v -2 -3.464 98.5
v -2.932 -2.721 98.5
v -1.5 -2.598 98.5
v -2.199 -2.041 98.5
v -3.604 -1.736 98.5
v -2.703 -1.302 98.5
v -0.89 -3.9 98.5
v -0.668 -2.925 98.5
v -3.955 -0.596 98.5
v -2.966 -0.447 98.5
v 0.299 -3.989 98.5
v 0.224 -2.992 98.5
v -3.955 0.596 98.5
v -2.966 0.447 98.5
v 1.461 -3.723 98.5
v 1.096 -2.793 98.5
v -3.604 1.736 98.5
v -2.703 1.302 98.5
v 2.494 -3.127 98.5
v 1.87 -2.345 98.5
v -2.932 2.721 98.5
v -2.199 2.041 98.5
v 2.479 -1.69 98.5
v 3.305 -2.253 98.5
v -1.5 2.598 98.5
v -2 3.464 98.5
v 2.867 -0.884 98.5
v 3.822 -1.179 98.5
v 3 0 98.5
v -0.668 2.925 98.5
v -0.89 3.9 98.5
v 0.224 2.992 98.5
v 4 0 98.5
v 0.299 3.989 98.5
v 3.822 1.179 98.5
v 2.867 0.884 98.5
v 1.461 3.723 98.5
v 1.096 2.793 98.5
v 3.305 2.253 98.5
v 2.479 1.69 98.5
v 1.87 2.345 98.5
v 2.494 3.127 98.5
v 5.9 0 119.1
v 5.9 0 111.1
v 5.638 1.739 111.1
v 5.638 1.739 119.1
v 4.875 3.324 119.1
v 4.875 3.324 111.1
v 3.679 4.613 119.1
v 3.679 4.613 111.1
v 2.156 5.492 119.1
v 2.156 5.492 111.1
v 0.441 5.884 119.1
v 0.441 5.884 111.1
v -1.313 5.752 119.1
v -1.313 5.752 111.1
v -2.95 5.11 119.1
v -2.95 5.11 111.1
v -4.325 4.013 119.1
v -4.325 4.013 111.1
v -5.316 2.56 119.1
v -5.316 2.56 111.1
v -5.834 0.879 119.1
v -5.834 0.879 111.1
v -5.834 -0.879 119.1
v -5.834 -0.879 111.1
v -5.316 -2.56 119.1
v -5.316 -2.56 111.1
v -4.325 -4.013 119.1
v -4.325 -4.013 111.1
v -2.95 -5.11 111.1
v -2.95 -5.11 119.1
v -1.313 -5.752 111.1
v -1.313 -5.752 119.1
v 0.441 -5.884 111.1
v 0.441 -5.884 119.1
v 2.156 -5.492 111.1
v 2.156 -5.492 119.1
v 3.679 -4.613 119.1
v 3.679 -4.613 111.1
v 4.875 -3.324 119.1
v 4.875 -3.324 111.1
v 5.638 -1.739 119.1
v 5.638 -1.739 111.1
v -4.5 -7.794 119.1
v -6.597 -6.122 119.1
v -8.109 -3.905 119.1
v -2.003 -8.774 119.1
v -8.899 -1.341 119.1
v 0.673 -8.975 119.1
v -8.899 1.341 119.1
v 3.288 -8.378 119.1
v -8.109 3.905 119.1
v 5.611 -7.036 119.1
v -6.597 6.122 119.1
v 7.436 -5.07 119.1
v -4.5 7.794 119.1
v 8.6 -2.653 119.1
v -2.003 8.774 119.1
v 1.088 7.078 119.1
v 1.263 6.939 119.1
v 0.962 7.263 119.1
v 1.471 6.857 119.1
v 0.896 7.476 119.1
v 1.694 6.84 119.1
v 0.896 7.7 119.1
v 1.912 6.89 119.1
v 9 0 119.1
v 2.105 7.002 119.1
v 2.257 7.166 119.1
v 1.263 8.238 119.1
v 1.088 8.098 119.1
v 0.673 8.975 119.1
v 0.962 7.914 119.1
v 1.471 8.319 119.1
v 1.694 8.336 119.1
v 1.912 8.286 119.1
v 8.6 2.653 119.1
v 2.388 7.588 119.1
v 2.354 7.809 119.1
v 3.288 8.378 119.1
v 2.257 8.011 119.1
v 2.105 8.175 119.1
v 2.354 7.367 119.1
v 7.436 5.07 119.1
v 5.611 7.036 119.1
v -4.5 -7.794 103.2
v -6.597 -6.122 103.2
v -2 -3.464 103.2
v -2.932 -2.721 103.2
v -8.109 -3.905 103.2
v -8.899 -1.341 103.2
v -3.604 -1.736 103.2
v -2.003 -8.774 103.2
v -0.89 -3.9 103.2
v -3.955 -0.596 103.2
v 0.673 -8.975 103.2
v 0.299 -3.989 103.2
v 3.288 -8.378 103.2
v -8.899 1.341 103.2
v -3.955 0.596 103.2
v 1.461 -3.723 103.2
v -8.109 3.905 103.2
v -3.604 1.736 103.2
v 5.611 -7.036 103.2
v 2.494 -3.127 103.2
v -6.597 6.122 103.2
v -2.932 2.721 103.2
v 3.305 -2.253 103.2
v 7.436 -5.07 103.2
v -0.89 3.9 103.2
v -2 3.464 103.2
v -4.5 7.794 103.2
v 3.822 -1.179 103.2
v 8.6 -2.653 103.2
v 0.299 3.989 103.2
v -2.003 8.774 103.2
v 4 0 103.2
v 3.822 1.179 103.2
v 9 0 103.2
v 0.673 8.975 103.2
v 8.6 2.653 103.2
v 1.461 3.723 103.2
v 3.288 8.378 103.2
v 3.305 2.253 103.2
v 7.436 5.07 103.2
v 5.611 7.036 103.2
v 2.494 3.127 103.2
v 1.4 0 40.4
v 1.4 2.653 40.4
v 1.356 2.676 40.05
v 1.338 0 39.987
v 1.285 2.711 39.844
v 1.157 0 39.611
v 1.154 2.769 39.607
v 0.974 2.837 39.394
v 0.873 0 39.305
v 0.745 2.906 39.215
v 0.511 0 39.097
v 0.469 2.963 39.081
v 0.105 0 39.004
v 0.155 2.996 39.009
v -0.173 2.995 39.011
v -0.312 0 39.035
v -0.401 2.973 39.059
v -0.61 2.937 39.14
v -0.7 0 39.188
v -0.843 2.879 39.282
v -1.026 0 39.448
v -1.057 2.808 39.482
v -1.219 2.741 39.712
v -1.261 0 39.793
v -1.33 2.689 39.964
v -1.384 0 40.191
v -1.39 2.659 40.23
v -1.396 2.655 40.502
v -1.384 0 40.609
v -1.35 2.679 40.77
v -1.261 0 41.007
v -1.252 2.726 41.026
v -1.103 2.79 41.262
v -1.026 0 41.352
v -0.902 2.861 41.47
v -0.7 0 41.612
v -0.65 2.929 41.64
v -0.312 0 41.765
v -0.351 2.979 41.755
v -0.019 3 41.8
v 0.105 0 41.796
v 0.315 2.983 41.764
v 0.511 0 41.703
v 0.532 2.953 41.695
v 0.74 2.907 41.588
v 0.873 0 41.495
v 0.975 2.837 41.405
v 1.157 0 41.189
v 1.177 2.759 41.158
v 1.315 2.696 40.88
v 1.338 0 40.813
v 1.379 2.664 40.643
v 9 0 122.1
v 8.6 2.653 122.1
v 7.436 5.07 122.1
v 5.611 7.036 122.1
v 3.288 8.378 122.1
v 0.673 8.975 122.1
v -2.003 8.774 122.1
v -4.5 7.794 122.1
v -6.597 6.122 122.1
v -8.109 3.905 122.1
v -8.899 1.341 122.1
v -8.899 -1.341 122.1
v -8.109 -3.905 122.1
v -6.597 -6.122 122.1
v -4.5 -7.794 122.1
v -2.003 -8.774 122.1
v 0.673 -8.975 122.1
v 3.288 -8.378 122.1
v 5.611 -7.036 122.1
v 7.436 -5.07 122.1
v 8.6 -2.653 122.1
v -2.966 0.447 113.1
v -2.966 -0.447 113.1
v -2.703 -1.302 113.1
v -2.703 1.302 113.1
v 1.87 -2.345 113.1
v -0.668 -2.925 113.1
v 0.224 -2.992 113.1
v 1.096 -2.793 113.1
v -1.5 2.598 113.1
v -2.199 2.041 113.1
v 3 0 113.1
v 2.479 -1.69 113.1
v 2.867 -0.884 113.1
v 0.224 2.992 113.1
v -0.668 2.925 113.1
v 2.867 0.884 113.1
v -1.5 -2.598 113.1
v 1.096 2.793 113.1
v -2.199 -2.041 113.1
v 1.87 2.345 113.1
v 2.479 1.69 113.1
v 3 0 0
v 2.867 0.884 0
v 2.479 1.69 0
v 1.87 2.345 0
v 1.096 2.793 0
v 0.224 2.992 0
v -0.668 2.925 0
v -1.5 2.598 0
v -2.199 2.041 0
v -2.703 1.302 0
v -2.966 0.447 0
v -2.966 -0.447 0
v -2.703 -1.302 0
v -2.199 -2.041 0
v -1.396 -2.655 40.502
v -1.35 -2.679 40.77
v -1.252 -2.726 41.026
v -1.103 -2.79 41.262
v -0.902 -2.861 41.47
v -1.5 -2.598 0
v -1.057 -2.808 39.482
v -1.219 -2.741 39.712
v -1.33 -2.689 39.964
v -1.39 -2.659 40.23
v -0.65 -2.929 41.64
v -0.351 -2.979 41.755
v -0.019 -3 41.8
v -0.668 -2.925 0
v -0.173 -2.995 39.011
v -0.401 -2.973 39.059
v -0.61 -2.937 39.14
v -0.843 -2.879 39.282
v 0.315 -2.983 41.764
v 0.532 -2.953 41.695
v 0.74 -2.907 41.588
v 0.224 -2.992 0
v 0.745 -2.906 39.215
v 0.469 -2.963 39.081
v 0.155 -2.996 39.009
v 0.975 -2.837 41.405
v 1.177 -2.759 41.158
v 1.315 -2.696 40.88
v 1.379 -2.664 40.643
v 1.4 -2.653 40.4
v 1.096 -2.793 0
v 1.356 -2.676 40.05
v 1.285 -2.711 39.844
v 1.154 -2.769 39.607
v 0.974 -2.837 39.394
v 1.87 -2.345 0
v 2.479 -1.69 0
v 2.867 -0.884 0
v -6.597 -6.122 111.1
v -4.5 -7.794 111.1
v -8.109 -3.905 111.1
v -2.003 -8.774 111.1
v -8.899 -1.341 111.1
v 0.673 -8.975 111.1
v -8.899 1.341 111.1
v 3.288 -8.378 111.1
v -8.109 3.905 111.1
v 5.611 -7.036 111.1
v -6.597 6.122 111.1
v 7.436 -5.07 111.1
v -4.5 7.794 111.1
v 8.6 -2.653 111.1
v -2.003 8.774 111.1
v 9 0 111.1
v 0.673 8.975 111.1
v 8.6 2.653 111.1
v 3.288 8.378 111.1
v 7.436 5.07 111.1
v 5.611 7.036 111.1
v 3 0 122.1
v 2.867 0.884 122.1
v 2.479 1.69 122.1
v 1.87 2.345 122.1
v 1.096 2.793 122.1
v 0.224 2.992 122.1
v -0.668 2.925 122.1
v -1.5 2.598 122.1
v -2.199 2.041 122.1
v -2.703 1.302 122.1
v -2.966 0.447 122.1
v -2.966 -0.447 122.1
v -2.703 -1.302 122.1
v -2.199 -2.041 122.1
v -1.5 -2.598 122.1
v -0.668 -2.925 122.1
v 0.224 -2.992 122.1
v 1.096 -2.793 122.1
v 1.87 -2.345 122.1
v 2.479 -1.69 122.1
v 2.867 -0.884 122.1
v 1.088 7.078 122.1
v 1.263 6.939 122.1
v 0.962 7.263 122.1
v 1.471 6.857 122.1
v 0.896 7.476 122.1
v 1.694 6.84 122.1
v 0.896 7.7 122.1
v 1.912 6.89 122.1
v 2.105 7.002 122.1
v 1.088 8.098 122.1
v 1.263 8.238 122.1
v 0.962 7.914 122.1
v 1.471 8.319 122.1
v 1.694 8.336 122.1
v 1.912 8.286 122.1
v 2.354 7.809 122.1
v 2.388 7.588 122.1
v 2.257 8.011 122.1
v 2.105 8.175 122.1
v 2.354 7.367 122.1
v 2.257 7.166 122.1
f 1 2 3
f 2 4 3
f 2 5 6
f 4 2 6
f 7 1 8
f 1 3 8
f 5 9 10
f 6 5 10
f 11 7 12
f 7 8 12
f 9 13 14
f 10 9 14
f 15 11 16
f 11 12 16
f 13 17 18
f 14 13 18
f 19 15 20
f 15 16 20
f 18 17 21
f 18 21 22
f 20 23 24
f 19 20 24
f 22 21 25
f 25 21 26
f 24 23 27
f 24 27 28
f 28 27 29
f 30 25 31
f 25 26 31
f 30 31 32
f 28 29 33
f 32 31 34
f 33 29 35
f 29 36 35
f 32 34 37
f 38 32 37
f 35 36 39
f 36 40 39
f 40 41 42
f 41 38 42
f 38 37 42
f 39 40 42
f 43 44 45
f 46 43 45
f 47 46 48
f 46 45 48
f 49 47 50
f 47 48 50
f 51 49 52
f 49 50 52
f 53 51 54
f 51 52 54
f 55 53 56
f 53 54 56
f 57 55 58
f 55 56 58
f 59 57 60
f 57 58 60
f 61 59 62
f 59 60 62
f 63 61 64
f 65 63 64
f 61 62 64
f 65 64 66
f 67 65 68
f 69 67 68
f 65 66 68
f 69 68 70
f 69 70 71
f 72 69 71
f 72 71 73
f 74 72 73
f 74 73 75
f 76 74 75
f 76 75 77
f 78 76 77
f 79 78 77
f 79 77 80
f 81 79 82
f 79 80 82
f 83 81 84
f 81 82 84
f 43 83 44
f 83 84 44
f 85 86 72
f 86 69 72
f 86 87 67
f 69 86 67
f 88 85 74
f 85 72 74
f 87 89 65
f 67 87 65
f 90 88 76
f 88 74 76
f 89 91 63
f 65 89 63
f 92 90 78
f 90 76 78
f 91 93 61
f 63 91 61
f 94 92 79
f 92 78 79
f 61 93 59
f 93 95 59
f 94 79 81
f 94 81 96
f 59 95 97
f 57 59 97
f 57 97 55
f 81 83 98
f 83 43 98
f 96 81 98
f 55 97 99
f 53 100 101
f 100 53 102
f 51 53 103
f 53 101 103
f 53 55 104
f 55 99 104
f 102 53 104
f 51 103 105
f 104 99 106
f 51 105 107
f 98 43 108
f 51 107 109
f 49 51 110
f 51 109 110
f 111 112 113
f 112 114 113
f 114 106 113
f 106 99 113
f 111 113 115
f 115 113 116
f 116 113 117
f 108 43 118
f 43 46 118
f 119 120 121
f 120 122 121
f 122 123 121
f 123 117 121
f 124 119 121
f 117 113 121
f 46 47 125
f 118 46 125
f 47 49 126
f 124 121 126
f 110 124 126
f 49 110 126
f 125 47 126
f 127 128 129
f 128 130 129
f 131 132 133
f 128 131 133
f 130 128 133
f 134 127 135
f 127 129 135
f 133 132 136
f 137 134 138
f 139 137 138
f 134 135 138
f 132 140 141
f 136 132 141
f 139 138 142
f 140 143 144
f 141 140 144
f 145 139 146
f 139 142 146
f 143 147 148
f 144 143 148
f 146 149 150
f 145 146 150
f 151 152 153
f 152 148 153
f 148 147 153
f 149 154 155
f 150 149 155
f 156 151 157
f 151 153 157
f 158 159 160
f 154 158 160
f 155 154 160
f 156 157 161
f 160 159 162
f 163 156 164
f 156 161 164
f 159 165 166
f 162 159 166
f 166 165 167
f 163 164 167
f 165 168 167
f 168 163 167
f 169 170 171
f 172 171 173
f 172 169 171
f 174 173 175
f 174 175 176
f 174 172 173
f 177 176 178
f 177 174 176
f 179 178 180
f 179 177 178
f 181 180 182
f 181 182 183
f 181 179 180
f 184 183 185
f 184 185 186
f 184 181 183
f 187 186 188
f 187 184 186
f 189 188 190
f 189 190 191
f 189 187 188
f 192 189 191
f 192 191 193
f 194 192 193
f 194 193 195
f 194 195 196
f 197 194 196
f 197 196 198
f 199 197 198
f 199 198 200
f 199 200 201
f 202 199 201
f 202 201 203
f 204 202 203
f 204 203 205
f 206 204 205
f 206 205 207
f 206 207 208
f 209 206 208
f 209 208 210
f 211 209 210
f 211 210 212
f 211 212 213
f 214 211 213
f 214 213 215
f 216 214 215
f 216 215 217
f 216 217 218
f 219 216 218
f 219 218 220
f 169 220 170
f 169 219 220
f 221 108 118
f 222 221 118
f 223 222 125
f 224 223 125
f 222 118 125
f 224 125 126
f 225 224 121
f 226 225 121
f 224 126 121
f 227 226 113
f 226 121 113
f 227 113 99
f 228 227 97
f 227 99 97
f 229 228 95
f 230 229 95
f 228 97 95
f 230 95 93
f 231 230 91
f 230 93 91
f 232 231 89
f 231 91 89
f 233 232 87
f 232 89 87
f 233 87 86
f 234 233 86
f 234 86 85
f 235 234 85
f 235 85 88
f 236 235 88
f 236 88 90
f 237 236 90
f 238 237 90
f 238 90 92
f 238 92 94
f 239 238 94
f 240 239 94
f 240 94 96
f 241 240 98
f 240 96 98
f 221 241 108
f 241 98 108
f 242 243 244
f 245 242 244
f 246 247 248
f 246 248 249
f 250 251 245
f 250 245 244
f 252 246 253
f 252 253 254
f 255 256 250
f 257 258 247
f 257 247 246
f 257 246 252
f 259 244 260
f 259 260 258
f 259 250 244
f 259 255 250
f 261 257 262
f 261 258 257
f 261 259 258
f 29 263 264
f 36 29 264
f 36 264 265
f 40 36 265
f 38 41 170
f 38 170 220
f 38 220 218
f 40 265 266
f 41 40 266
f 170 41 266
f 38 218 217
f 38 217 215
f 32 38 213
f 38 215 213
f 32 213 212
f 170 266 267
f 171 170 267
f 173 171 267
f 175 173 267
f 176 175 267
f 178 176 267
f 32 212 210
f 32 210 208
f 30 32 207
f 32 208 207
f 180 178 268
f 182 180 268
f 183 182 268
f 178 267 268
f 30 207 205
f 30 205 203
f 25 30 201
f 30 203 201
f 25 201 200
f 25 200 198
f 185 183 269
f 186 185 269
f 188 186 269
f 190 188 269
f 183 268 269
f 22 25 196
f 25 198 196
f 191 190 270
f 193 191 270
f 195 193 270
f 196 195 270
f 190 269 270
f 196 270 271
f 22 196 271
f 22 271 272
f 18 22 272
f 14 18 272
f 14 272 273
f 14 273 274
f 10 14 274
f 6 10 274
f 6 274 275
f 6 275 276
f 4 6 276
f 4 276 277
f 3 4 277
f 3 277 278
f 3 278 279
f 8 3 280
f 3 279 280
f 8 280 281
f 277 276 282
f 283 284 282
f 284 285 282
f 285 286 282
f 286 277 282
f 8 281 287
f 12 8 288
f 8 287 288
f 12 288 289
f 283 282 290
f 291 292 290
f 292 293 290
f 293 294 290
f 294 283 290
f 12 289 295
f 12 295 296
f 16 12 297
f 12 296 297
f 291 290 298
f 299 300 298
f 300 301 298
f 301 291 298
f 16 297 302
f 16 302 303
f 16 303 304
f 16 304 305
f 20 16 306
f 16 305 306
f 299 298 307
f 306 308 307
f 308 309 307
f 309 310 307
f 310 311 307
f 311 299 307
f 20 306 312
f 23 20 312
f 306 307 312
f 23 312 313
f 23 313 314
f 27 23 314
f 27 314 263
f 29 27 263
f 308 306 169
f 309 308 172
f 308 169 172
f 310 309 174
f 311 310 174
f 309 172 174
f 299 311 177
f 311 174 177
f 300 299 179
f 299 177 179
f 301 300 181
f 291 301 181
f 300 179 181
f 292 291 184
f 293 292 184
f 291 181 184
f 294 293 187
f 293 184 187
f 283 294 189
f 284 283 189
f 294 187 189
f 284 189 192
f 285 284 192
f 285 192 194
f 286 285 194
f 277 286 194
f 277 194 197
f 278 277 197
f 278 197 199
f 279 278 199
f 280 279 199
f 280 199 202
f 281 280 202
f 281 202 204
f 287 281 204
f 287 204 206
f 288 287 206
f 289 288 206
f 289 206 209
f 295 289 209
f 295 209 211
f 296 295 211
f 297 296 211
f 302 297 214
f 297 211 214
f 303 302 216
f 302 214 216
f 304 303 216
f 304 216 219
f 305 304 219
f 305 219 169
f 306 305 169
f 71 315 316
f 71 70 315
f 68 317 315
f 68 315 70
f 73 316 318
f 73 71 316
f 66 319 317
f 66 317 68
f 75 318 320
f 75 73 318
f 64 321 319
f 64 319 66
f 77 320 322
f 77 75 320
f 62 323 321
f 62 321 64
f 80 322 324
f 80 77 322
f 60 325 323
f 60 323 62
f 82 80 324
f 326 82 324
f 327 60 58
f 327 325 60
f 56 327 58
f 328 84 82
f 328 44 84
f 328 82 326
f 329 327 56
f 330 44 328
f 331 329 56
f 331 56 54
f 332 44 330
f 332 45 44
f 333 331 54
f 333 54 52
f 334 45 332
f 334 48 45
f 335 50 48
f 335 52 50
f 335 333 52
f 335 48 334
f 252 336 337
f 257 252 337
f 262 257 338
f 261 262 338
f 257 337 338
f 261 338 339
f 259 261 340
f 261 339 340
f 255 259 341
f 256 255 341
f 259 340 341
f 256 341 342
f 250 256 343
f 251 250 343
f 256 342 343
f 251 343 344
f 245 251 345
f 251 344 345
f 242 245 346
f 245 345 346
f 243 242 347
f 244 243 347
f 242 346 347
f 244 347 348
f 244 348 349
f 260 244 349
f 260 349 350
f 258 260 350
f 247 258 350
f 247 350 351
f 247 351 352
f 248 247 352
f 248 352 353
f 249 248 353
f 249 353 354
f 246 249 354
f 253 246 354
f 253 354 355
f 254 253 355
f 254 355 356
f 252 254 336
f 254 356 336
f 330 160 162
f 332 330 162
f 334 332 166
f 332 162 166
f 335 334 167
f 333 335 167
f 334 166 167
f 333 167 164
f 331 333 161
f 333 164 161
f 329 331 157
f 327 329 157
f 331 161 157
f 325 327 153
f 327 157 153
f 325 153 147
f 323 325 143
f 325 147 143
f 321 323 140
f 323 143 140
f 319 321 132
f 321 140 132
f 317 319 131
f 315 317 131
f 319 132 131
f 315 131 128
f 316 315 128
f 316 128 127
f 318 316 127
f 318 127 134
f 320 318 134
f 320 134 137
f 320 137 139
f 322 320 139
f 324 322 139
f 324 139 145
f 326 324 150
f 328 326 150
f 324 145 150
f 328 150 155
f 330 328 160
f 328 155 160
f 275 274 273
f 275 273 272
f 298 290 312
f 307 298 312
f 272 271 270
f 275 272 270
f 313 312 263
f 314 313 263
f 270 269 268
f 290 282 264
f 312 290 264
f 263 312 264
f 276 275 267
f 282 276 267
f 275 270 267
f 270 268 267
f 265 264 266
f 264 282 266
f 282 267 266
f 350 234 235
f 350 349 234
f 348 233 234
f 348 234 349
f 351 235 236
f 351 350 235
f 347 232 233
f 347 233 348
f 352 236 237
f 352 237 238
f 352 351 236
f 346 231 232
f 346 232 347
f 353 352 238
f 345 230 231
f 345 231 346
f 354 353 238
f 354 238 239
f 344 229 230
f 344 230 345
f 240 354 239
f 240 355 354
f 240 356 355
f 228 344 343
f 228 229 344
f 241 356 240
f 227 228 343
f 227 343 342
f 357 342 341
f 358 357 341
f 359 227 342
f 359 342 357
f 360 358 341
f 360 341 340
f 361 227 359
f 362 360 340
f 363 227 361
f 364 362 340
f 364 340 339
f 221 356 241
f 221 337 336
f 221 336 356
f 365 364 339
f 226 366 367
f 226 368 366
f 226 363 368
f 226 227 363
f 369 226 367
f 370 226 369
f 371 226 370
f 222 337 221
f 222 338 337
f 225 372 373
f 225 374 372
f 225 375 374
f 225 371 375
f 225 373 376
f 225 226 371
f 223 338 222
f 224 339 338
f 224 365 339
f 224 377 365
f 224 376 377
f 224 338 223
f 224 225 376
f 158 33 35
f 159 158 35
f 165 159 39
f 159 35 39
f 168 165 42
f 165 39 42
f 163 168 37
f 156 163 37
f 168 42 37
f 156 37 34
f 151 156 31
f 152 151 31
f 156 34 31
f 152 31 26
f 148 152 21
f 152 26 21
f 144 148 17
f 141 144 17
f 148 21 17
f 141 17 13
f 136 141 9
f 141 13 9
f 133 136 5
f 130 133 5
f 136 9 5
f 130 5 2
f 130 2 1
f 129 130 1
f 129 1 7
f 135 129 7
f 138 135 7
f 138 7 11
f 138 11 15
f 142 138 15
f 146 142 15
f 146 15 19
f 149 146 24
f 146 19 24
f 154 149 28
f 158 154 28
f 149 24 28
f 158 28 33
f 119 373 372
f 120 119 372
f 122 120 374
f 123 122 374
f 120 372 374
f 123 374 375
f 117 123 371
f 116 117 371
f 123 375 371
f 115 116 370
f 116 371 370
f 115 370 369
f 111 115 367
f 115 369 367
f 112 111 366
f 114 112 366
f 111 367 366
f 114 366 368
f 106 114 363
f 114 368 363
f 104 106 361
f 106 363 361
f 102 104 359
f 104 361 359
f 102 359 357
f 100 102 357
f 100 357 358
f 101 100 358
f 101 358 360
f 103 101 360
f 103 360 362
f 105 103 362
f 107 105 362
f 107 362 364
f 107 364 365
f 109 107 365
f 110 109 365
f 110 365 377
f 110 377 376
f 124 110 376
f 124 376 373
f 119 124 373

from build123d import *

# Parameters (mm, degrees)
SKETCH1_R               = 3
BOSS_EXTRUDE1_DEPTH     = 98.5
SKETCH2_R               = 4
BOSS_EXTRUDE2_DEPTH     = 4.7
SKETCH3_R               = 9
BOSS_EXTRUDE3_DEPTH     = 7.9
SKETCH4_R               = 5.9
BOSS_EXTRUDE4_DEPTH     = 8
SKETCH5_R               = 9
BOSS_EXTRUDE5_DEPTH     = 3
CUT_EXTRUDE1_DEPTH      = 82
CUT_EXTRUDE1_DEPTH_BACK = 82
SKETCH6_R               = 1.4
CUT_EXTRUDE2_START      = -9
SKETCH7_R               = 3
SKETCH7_R_2             = 0.75
CUT_EXTRUDE2_DEPTH      = 9


with BuildPart() as part:
    # Sketch1 → Boss-Extrude1 (new body)
    with BuildSketch(Plane.XY):
        Circle(SKETCH1_R)
    extrude(amount=BOSS_EXTRUDE1_DEPTH)

    # Sketch2 → Boss-Extrude2 (add)
    with BuildSketch(Plane.XY.offset(98.5)):
        Circle(SKETCH2_R)
    extrude(amount=BOSS_EXTRUDE2_DEPTH)

    # Sketch3 → Boss-Extrude3 (add)
    with BuildSketch(Plane.XY.offset(103.2)):
        Circle(SKETCH3_R)
    extrude(amount=BOSS_EXTRUDE3_DEPTH)

    # Sketch4 → Boss-Extrude4 (add)
    with BuildSketch(Plane.XY.offset(111.1)):
        Circle(SKETCH4_R)
    extrude(amount=BOSS_EXTRUDE4_DEPTH)

    # Sketch5 → Boss-Extrude5 (add)
    with BuildSketch(Plane.XY.offset(119.1)):
        Circle(SKETCH5_R)
    extrude(amount=BOSS_EXTRUDE5_DEPTH)

    # Sketch6 → Cut-Extrude1 (cut, two sides: drawn at the far end of the back side and taken through both)
    with BuildSketch(Plane(origin=(0, 0, 0), x_dir=(1, 0, 0), z_dir=(0, 1, 0)).offset(-CUT_EXTRUDE1_DEPTH_BACK)):
        with Locations((0, -40.4)):
            Circle(SKETCH6_R)
    extrude(amount=CUT_EXTRUDE1_DEPTH + CUT_EXTRUDE1_DEPTH_BACK, mode=Mode.SUBTRACT)

    # Sketch7 → Cut-Extrude2 (cut)
    with BuildSketch(Plane.XY.offset(122.1).offset(CUT_EXTRUDE2_START)):
        Circle(SKETCH7_R)
        with Locations((1.637751338, 7.588247864)):
            Circle(SKETCH7_R_2)
    extrude(amount=CUT_EXTRUDE2_DEPTH, mode=Mode.SUBTRACT)


solid = part.part
